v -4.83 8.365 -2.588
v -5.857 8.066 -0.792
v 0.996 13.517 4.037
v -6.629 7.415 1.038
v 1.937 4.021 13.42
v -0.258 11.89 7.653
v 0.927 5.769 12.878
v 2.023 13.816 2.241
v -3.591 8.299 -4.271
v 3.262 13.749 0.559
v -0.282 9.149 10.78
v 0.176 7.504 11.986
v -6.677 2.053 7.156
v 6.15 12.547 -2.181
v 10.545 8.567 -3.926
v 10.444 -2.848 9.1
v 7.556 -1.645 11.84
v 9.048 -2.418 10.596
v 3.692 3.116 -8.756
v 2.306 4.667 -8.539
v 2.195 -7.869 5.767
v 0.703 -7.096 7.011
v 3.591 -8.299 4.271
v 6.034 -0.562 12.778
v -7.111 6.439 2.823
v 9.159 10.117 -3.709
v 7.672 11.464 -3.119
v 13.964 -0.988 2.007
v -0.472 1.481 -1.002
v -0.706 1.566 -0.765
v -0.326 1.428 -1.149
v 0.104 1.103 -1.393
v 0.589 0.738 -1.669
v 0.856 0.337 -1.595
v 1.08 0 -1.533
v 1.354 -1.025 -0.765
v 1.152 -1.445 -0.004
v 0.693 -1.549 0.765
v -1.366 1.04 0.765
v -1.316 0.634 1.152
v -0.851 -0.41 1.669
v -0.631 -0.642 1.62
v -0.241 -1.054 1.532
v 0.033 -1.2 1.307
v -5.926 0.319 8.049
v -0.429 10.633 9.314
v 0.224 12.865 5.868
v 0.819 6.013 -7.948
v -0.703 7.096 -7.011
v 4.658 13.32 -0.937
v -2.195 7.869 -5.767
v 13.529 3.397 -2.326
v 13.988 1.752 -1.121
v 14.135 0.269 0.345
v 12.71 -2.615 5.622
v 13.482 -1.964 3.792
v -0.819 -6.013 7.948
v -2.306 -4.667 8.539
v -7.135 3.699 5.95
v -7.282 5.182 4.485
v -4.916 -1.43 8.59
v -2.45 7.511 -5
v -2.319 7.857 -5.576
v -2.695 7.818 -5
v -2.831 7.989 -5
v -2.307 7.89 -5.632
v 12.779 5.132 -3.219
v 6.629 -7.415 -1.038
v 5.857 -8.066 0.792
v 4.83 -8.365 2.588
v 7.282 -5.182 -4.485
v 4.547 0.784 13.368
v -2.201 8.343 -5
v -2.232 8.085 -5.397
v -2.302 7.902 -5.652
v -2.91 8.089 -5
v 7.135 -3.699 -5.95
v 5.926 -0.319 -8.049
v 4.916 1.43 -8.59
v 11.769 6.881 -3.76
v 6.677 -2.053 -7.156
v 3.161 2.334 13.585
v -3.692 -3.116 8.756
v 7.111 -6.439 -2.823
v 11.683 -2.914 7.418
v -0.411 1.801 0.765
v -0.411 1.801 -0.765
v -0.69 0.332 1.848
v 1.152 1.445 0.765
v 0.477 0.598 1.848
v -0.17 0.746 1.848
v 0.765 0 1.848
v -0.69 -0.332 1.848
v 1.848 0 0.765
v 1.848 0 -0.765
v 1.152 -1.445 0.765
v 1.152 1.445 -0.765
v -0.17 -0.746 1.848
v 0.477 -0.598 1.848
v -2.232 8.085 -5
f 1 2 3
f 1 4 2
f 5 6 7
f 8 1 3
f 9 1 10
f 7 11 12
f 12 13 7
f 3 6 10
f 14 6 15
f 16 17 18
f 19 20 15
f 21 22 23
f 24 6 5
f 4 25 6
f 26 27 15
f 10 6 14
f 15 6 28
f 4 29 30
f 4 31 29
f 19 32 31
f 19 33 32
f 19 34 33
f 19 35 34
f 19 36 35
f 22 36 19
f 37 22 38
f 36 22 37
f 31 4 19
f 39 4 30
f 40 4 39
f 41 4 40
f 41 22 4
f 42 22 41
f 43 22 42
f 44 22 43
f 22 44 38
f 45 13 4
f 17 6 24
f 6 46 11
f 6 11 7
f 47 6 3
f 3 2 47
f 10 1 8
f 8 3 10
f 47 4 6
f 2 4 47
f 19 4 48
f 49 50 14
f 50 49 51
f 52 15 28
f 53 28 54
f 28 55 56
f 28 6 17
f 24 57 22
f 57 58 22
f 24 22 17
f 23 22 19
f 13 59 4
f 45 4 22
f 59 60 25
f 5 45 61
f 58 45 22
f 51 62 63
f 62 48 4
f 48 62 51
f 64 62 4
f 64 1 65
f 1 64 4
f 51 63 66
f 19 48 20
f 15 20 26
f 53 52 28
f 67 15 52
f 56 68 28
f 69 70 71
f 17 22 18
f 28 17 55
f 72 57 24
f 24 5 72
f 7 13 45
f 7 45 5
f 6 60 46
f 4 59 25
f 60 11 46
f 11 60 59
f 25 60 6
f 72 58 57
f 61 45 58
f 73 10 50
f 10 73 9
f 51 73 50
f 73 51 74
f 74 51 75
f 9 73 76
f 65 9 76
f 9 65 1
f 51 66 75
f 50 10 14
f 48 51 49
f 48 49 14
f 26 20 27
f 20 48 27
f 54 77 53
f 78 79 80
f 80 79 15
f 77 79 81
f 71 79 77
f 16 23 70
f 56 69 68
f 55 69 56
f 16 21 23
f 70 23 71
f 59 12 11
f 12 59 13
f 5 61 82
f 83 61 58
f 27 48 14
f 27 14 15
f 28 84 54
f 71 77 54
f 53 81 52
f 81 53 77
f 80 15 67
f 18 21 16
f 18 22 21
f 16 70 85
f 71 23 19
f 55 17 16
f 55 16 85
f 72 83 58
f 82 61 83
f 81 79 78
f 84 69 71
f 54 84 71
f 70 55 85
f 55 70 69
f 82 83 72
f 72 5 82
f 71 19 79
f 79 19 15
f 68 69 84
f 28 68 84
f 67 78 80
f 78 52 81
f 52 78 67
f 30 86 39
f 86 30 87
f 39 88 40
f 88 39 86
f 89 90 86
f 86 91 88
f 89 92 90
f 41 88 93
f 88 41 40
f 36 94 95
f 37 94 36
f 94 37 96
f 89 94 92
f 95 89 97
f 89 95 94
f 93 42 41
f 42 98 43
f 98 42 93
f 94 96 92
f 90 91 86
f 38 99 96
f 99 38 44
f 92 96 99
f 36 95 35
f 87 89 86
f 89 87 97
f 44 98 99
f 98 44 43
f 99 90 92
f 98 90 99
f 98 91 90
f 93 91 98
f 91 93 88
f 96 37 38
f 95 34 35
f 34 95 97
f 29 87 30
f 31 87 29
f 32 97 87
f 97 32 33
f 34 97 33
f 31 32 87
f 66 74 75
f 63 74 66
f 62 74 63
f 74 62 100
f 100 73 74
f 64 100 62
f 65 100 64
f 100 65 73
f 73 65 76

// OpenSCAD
// Generated by generate_scads.py
difference() {
  rotate([60,15,120]) {
    cylinder(h=10, r=10, center=false);
  }
  sphere(r=2);
  translate([-10,10,-20]) {
    cylinder(h=15, r=8, center=false);
  }
}
